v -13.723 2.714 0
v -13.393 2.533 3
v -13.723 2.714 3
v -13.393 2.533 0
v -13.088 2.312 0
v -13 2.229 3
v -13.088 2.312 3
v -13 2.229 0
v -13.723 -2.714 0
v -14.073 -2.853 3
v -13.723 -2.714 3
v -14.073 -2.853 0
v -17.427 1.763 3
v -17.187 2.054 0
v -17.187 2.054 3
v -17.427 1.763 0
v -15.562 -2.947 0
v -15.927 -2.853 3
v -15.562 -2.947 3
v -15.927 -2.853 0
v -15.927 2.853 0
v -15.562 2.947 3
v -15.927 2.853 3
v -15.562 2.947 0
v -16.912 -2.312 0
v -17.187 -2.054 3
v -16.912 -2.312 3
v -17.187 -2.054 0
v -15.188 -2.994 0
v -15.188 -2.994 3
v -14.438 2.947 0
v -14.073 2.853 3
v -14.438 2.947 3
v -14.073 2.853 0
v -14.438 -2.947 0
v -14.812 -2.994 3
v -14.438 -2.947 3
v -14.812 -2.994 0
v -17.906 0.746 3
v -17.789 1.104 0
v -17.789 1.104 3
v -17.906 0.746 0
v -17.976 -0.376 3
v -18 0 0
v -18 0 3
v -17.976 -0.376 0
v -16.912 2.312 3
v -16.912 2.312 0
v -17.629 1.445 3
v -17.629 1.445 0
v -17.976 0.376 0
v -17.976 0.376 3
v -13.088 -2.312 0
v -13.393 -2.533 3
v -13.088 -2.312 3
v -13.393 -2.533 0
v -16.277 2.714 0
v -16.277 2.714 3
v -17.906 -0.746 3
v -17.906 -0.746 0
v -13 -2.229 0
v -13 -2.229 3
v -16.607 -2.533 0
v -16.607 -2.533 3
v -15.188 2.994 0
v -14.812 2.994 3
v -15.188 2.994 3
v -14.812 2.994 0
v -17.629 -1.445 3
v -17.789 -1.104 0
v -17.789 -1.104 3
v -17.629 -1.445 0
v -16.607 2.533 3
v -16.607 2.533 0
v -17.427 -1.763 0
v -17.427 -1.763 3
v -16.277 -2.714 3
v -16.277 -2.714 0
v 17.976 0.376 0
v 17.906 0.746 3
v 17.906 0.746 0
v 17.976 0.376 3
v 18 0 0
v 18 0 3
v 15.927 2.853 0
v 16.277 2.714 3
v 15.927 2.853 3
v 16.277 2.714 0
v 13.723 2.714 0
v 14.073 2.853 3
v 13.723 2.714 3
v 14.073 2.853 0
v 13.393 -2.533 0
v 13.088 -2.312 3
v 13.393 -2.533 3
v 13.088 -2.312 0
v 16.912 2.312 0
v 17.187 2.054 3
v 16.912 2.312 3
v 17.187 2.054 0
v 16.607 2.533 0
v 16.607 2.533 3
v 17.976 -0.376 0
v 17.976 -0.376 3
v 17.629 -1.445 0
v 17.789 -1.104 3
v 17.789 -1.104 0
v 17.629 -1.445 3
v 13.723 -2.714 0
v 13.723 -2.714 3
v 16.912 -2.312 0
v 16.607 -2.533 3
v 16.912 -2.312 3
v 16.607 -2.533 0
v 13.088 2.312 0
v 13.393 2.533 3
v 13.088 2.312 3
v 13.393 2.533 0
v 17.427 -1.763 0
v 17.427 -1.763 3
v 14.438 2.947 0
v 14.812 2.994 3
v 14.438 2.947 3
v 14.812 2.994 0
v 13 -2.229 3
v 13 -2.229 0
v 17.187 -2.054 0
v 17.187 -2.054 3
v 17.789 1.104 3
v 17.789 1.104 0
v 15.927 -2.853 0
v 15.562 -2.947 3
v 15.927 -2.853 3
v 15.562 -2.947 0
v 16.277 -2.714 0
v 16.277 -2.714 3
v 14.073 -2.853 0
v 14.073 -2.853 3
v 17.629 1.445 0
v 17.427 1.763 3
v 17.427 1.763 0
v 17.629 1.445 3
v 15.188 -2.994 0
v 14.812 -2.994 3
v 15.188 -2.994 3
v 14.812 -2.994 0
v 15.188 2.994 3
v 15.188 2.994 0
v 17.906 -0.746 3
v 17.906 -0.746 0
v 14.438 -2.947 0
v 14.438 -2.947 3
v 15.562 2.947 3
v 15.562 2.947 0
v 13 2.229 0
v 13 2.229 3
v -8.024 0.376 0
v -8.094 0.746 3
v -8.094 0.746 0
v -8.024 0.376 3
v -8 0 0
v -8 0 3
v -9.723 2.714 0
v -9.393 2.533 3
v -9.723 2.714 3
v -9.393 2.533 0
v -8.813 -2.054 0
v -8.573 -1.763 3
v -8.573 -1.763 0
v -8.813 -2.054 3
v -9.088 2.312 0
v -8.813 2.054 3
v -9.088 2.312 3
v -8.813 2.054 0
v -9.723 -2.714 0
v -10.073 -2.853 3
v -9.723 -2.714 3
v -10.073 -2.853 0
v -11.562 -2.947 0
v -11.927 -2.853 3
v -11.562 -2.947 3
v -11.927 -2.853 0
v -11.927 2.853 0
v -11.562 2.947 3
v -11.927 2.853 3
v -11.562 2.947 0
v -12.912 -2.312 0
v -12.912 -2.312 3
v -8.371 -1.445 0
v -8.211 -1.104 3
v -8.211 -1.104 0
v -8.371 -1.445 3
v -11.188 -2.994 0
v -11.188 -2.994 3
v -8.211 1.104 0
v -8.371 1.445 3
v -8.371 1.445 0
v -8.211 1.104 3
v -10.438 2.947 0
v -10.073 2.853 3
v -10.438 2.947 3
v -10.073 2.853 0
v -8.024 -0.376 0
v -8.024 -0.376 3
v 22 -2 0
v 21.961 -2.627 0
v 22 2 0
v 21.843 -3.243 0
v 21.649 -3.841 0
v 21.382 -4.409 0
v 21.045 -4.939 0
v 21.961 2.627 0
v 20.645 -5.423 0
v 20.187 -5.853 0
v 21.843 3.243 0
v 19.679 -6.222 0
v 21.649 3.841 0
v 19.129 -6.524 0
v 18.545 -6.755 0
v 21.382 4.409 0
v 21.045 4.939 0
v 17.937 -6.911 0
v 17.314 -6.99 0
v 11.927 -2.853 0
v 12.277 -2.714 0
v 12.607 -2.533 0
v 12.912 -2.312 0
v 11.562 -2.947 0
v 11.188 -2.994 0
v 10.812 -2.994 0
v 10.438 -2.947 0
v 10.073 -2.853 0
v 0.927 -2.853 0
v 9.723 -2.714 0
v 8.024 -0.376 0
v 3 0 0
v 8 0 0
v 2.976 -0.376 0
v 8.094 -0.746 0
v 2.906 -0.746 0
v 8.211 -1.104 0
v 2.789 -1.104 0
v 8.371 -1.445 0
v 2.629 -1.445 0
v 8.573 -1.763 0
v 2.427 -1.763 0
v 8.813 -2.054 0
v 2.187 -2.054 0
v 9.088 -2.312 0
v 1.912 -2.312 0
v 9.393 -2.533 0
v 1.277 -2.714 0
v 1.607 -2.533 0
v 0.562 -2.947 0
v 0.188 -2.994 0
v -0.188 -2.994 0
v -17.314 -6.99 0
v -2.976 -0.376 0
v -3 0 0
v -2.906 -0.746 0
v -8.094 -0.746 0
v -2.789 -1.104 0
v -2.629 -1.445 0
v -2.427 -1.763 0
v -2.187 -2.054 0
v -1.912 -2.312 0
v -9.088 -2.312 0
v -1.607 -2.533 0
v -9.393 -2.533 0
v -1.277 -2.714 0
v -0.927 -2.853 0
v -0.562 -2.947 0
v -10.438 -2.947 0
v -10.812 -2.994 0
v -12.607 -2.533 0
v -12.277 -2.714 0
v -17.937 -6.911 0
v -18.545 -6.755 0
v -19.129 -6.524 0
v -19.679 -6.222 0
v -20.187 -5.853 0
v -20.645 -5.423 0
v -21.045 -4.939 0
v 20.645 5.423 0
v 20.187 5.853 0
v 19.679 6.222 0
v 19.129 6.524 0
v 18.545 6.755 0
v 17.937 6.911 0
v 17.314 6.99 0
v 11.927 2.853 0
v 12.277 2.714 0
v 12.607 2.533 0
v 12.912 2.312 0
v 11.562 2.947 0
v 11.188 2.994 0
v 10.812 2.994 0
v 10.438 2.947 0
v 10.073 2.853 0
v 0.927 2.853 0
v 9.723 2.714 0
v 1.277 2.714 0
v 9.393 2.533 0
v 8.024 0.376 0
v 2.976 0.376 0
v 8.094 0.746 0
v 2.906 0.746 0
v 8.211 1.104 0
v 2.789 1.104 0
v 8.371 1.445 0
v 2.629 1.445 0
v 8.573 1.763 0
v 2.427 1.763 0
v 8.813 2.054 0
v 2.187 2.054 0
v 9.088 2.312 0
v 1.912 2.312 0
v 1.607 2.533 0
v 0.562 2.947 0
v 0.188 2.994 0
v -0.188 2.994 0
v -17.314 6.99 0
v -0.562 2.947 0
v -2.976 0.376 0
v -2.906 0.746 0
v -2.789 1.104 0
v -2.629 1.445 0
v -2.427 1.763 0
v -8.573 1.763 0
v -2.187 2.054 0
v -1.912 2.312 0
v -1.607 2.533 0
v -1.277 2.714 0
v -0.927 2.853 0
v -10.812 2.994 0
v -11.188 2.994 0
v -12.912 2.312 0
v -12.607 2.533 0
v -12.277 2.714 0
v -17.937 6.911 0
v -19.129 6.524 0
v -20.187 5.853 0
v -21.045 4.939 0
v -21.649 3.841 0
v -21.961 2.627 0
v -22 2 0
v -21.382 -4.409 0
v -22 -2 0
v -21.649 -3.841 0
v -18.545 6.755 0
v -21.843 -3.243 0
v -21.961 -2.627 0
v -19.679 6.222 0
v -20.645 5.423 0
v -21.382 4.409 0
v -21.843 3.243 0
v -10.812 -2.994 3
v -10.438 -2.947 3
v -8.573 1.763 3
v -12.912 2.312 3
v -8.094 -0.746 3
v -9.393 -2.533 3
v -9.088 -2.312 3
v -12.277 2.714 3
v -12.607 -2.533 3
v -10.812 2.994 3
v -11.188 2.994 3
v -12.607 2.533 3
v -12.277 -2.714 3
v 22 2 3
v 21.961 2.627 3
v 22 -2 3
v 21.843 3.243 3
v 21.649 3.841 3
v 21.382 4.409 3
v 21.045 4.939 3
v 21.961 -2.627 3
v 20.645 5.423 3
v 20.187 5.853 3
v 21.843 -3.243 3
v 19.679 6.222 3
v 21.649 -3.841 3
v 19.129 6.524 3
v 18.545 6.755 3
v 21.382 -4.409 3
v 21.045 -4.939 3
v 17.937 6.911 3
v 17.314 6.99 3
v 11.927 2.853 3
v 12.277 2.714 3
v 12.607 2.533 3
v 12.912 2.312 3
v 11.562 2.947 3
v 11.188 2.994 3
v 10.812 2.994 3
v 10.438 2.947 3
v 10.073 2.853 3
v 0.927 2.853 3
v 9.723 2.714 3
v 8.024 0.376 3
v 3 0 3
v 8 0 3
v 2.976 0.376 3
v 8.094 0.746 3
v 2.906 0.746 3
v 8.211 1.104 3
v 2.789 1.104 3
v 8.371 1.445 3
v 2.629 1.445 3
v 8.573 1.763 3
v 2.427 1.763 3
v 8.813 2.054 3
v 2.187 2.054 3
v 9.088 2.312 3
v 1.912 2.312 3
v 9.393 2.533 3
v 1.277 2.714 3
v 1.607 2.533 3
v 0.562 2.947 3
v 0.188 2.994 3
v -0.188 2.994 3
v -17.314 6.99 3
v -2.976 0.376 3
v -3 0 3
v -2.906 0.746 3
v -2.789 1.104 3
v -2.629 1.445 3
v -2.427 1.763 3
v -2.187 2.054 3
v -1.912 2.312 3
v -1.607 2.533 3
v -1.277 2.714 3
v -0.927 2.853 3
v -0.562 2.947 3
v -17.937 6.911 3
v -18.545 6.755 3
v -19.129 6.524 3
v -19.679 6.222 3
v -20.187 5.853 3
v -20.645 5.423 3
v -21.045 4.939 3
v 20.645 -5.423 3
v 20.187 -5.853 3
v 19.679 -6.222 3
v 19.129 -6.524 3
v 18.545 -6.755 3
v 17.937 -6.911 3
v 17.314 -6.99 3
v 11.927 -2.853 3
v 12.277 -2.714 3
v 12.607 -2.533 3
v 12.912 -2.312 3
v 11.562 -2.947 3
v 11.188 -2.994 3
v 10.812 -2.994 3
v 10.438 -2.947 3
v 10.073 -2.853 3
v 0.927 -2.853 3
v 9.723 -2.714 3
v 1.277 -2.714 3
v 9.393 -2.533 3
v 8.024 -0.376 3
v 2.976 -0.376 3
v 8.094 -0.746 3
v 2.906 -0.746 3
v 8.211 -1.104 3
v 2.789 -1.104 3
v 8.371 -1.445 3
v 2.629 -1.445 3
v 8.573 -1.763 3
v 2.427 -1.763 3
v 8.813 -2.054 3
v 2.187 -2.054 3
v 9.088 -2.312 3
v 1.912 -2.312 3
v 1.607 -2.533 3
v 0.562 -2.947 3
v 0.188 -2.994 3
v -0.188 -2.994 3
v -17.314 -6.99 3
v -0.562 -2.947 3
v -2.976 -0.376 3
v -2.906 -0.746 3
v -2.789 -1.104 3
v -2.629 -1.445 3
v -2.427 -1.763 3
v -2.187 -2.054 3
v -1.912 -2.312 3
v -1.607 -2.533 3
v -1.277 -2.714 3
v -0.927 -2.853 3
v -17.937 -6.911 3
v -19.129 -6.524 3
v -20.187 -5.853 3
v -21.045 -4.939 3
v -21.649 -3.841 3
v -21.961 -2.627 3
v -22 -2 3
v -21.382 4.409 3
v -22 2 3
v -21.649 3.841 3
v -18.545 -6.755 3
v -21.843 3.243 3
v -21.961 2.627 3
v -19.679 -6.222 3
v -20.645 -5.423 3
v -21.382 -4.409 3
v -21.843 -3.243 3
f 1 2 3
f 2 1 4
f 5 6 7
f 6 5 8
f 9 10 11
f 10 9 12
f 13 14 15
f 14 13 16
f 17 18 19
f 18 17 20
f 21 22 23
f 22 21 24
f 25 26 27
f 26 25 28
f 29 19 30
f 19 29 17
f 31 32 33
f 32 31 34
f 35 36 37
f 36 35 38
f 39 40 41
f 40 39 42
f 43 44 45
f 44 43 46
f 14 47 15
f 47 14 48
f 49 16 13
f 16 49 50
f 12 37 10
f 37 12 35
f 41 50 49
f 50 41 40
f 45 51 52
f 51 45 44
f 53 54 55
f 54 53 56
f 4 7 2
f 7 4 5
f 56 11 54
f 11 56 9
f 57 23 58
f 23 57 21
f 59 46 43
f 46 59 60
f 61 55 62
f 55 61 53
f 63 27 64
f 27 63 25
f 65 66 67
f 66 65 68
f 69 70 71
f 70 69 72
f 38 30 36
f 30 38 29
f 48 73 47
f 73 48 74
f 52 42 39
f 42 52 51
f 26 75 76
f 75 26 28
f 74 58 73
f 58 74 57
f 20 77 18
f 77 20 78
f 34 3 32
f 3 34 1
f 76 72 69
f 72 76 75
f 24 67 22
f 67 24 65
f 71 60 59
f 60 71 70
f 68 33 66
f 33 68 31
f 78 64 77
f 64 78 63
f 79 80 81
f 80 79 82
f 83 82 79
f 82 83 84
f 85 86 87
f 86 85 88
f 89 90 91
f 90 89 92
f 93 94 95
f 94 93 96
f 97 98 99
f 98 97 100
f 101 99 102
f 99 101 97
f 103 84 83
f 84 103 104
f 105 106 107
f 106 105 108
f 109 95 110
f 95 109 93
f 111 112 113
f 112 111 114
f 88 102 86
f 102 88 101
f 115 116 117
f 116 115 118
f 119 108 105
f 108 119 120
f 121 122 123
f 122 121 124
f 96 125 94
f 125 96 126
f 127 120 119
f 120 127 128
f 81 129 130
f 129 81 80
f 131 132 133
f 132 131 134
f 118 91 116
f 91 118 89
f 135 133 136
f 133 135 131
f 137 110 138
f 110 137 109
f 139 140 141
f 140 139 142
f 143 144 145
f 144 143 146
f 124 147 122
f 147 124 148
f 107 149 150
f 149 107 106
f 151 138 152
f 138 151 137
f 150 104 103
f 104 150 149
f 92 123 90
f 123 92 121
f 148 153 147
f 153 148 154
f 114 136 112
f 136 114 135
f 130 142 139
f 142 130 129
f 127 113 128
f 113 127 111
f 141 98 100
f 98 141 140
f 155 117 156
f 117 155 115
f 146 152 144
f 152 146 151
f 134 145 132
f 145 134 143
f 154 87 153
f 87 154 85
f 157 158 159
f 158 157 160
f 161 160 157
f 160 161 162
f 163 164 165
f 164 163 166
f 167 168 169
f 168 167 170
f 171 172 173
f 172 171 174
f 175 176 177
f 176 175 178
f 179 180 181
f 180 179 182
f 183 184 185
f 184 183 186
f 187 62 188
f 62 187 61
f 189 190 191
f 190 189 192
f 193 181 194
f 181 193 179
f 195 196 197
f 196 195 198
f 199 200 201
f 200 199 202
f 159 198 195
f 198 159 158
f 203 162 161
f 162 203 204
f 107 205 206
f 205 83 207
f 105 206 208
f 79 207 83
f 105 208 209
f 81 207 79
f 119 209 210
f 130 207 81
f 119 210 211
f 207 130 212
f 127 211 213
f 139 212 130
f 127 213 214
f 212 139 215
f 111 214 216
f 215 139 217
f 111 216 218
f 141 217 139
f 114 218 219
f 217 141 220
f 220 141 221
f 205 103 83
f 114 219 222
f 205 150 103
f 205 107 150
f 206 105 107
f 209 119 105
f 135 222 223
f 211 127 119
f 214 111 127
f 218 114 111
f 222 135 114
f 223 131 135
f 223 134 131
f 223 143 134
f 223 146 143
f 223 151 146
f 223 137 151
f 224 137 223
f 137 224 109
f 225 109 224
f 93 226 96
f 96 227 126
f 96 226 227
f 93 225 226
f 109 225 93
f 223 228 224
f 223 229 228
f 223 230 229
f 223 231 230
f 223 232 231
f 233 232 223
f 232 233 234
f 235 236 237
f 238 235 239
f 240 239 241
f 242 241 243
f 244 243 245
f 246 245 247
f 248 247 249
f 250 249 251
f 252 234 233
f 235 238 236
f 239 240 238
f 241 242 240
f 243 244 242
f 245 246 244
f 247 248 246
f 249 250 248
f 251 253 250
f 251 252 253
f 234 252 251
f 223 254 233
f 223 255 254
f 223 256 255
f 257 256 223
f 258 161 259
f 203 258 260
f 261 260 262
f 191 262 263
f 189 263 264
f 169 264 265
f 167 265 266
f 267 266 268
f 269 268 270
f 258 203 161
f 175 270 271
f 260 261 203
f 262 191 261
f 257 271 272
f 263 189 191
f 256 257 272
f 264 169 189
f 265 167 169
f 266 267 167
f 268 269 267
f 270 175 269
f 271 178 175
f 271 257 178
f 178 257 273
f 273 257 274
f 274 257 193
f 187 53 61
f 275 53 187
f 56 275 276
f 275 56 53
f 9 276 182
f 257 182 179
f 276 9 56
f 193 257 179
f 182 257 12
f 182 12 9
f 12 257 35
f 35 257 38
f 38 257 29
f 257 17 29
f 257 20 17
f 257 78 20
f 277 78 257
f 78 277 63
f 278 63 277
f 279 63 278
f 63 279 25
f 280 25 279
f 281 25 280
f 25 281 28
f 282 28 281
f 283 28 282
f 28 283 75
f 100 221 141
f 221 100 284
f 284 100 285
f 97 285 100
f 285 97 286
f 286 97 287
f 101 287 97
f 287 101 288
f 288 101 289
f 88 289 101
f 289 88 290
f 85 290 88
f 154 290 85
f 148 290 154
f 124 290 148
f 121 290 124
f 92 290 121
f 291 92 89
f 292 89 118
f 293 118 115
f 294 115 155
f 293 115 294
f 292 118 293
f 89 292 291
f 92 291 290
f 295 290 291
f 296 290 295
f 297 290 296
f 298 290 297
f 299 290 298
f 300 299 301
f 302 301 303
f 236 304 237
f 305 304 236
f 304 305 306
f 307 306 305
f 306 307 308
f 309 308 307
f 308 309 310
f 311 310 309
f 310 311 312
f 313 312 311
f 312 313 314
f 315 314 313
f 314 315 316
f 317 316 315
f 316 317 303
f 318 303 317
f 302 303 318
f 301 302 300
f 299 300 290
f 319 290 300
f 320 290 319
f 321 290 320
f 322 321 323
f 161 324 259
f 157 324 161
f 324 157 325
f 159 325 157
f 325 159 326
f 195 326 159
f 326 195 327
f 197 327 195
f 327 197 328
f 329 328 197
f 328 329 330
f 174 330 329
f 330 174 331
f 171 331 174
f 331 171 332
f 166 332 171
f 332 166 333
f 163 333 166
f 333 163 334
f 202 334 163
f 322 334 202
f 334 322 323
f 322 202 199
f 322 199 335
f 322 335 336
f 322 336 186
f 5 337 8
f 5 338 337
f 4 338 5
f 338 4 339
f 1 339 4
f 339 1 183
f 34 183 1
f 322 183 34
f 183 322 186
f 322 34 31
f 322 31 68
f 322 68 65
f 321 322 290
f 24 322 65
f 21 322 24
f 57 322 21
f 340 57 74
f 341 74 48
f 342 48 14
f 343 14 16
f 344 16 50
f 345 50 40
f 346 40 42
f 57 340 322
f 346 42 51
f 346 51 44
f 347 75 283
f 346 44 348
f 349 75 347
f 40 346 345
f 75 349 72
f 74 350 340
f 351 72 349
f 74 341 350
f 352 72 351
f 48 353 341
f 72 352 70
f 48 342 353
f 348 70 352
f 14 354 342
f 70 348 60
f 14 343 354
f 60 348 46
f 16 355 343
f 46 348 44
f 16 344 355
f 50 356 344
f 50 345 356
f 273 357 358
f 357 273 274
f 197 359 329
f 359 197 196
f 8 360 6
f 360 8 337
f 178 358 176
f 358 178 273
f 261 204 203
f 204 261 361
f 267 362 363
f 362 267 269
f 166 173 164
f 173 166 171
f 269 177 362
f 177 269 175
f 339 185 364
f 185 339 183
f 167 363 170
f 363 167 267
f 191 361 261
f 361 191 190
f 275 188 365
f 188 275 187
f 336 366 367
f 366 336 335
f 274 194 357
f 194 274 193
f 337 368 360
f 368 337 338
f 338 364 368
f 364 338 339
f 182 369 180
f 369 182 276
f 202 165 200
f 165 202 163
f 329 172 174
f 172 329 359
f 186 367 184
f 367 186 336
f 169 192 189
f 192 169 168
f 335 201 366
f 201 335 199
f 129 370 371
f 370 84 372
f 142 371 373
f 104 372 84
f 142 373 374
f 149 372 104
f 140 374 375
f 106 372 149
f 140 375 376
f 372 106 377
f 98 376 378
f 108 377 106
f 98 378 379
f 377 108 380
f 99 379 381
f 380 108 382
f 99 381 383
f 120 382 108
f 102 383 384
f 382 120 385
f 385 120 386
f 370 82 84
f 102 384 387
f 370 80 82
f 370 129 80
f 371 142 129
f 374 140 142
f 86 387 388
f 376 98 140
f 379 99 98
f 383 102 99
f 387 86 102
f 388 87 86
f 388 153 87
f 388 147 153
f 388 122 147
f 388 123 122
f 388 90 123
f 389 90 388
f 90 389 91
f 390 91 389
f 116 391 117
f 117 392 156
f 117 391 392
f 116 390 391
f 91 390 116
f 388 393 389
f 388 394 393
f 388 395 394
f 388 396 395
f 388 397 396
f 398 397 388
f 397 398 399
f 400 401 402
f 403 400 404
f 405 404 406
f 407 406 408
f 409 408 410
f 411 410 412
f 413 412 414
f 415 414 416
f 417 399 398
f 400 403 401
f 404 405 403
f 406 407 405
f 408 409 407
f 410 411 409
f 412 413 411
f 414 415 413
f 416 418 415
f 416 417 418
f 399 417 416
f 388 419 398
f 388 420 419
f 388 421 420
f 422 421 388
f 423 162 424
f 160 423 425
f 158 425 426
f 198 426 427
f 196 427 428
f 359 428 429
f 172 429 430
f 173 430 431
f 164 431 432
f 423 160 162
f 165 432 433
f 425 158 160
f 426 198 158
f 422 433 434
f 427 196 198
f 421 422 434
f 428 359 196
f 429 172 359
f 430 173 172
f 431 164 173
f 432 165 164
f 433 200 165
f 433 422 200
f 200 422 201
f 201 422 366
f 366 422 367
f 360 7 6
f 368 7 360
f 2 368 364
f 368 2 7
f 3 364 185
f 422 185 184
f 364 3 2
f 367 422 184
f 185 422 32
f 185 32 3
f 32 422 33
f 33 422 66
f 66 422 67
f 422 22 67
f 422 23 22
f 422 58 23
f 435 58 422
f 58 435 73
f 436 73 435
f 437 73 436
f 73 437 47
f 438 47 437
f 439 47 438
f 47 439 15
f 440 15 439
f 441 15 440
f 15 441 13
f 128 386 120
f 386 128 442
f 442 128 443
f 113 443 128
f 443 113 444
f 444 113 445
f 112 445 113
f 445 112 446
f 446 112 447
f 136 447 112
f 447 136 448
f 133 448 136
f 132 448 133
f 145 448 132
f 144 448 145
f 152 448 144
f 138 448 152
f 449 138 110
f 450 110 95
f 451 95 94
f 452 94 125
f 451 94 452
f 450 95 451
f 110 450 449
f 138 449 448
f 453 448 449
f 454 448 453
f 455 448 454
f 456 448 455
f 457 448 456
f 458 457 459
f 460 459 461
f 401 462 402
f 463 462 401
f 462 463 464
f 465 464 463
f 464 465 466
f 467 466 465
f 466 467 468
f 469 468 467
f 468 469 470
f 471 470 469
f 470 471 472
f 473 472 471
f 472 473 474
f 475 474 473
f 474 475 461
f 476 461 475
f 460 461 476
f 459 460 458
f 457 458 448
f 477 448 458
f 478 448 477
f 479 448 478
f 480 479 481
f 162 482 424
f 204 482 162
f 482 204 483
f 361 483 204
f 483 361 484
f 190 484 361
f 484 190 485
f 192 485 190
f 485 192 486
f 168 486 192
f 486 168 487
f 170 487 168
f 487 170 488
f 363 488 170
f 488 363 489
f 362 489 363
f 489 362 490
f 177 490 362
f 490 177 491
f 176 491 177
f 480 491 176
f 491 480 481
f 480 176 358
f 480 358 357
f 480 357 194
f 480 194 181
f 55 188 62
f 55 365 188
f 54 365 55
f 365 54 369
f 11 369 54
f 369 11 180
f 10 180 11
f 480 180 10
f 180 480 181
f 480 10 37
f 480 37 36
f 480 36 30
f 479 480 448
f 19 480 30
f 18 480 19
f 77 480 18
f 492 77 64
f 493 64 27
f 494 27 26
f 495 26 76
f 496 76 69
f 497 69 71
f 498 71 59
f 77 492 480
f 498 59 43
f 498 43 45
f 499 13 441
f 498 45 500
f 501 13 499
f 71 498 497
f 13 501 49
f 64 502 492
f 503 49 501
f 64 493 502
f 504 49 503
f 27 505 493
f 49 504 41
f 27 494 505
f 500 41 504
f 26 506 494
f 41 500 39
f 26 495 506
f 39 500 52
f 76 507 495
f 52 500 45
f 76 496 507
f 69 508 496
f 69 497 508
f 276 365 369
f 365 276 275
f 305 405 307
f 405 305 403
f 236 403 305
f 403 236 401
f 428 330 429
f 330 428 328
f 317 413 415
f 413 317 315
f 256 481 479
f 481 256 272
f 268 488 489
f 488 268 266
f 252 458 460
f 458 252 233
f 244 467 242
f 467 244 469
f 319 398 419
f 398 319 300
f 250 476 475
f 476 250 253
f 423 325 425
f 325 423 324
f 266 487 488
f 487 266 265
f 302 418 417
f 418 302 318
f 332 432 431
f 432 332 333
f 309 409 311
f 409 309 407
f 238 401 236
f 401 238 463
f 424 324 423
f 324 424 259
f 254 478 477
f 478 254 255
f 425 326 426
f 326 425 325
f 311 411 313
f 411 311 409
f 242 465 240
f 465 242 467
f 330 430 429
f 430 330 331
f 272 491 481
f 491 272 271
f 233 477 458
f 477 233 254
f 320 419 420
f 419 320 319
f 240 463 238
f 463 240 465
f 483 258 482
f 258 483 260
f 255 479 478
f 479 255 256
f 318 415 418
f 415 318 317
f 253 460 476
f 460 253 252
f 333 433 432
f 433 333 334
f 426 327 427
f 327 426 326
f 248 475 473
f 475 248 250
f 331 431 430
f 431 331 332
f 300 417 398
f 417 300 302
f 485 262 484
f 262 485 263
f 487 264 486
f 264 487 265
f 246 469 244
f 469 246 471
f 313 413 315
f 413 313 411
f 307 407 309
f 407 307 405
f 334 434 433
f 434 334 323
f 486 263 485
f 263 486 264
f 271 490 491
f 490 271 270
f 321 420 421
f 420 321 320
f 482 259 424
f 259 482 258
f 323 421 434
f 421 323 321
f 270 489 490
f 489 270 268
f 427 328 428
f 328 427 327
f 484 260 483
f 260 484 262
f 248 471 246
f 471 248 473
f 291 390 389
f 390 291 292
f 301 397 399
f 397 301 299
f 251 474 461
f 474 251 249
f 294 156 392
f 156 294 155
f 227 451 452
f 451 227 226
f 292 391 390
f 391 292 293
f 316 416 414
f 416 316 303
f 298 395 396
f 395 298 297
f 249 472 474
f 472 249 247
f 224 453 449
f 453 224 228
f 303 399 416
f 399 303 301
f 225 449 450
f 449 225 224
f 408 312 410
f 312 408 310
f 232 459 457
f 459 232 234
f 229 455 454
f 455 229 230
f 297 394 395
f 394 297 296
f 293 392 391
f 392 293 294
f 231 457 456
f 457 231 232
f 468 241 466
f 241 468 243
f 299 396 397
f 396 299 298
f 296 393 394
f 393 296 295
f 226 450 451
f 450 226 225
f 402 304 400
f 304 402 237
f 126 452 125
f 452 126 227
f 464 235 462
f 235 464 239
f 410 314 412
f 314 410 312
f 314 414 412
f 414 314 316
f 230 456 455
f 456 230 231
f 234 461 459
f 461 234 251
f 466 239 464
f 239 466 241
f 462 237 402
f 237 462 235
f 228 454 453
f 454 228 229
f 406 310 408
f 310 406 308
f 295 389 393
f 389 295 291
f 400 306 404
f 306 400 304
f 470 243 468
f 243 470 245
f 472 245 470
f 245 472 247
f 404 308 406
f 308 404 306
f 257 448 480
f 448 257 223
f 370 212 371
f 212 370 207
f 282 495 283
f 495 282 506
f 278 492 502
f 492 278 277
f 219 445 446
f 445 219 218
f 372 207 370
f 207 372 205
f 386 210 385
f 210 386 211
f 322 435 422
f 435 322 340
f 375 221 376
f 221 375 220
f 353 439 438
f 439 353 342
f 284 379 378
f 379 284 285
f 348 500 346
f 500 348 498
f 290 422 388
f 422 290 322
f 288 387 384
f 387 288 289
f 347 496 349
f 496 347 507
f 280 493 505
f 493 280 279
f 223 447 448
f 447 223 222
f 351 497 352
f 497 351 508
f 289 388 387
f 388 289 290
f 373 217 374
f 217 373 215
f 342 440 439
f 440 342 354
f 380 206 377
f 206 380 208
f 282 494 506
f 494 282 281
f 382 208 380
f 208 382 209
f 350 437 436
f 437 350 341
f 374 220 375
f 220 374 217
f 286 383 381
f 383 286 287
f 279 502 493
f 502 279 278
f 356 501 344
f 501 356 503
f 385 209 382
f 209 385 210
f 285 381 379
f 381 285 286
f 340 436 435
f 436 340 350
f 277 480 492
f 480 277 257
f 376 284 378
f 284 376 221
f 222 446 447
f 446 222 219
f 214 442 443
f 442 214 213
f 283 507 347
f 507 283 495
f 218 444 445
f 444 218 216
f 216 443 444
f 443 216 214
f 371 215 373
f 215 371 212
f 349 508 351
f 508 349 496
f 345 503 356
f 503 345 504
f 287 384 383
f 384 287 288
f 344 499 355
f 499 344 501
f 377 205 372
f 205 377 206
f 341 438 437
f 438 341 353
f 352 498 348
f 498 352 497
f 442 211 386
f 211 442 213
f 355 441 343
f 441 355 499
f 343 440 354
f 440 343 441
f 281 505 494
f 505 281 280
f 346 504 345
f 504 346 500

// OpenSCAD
$fn = 50;


difference() {
	union() {
		hull() {
			translate(v = [-17.0000000000, 2.0000000000, 0]) {
				cylinder(h = 3, r = 5);
			}
			translate(v = [17.0000000000, 2.0000000000, 0]) {
				cylinder(h = 3, r = 5);
			}
			translate(v = [-17.0000000000, -2.0000000000, 0]) {
				cylinder(h = 3, r = 5);
			}
			translate(v = [17.0000000000, -2.0000000000, 0]) {
				cylinder(h = 3, r = 5);
			}
		}
	}
	union() {
		#translate(v = [-15.0000000000, 0.0000000000, -100.0000000000]) {
			cylinder(h = 200, r = 3.0000000000);
		}
		#translate(v = [-15.0000000000, 0.0000000000, -100.0000000000]) {
			cylinder(h = 200, r = 3.0000000000);
		}
		#translate(v = [15.0000000000, 0.0000000000, -100.0000000000]) {
			cylinder(h = 200, r = 3.0000000000);
		}
		#translate(v = [15.0000000000, 0.0000000000, -100.0000000000]) {
			cylinder(h = 200, r = 3.0000000000);
		}
		#translate(v = [-11.0000000000, 0, 0]) {
			cylinder(h = 3, r = 3.0000000000);
		}
		#cylinder(h = 3, r = 3.0000000000);
		#translate(v = [11.0000000000, 0, 0]) {
			cylinder(h = 3, r = 3.0000000000);
		}
	}
}
